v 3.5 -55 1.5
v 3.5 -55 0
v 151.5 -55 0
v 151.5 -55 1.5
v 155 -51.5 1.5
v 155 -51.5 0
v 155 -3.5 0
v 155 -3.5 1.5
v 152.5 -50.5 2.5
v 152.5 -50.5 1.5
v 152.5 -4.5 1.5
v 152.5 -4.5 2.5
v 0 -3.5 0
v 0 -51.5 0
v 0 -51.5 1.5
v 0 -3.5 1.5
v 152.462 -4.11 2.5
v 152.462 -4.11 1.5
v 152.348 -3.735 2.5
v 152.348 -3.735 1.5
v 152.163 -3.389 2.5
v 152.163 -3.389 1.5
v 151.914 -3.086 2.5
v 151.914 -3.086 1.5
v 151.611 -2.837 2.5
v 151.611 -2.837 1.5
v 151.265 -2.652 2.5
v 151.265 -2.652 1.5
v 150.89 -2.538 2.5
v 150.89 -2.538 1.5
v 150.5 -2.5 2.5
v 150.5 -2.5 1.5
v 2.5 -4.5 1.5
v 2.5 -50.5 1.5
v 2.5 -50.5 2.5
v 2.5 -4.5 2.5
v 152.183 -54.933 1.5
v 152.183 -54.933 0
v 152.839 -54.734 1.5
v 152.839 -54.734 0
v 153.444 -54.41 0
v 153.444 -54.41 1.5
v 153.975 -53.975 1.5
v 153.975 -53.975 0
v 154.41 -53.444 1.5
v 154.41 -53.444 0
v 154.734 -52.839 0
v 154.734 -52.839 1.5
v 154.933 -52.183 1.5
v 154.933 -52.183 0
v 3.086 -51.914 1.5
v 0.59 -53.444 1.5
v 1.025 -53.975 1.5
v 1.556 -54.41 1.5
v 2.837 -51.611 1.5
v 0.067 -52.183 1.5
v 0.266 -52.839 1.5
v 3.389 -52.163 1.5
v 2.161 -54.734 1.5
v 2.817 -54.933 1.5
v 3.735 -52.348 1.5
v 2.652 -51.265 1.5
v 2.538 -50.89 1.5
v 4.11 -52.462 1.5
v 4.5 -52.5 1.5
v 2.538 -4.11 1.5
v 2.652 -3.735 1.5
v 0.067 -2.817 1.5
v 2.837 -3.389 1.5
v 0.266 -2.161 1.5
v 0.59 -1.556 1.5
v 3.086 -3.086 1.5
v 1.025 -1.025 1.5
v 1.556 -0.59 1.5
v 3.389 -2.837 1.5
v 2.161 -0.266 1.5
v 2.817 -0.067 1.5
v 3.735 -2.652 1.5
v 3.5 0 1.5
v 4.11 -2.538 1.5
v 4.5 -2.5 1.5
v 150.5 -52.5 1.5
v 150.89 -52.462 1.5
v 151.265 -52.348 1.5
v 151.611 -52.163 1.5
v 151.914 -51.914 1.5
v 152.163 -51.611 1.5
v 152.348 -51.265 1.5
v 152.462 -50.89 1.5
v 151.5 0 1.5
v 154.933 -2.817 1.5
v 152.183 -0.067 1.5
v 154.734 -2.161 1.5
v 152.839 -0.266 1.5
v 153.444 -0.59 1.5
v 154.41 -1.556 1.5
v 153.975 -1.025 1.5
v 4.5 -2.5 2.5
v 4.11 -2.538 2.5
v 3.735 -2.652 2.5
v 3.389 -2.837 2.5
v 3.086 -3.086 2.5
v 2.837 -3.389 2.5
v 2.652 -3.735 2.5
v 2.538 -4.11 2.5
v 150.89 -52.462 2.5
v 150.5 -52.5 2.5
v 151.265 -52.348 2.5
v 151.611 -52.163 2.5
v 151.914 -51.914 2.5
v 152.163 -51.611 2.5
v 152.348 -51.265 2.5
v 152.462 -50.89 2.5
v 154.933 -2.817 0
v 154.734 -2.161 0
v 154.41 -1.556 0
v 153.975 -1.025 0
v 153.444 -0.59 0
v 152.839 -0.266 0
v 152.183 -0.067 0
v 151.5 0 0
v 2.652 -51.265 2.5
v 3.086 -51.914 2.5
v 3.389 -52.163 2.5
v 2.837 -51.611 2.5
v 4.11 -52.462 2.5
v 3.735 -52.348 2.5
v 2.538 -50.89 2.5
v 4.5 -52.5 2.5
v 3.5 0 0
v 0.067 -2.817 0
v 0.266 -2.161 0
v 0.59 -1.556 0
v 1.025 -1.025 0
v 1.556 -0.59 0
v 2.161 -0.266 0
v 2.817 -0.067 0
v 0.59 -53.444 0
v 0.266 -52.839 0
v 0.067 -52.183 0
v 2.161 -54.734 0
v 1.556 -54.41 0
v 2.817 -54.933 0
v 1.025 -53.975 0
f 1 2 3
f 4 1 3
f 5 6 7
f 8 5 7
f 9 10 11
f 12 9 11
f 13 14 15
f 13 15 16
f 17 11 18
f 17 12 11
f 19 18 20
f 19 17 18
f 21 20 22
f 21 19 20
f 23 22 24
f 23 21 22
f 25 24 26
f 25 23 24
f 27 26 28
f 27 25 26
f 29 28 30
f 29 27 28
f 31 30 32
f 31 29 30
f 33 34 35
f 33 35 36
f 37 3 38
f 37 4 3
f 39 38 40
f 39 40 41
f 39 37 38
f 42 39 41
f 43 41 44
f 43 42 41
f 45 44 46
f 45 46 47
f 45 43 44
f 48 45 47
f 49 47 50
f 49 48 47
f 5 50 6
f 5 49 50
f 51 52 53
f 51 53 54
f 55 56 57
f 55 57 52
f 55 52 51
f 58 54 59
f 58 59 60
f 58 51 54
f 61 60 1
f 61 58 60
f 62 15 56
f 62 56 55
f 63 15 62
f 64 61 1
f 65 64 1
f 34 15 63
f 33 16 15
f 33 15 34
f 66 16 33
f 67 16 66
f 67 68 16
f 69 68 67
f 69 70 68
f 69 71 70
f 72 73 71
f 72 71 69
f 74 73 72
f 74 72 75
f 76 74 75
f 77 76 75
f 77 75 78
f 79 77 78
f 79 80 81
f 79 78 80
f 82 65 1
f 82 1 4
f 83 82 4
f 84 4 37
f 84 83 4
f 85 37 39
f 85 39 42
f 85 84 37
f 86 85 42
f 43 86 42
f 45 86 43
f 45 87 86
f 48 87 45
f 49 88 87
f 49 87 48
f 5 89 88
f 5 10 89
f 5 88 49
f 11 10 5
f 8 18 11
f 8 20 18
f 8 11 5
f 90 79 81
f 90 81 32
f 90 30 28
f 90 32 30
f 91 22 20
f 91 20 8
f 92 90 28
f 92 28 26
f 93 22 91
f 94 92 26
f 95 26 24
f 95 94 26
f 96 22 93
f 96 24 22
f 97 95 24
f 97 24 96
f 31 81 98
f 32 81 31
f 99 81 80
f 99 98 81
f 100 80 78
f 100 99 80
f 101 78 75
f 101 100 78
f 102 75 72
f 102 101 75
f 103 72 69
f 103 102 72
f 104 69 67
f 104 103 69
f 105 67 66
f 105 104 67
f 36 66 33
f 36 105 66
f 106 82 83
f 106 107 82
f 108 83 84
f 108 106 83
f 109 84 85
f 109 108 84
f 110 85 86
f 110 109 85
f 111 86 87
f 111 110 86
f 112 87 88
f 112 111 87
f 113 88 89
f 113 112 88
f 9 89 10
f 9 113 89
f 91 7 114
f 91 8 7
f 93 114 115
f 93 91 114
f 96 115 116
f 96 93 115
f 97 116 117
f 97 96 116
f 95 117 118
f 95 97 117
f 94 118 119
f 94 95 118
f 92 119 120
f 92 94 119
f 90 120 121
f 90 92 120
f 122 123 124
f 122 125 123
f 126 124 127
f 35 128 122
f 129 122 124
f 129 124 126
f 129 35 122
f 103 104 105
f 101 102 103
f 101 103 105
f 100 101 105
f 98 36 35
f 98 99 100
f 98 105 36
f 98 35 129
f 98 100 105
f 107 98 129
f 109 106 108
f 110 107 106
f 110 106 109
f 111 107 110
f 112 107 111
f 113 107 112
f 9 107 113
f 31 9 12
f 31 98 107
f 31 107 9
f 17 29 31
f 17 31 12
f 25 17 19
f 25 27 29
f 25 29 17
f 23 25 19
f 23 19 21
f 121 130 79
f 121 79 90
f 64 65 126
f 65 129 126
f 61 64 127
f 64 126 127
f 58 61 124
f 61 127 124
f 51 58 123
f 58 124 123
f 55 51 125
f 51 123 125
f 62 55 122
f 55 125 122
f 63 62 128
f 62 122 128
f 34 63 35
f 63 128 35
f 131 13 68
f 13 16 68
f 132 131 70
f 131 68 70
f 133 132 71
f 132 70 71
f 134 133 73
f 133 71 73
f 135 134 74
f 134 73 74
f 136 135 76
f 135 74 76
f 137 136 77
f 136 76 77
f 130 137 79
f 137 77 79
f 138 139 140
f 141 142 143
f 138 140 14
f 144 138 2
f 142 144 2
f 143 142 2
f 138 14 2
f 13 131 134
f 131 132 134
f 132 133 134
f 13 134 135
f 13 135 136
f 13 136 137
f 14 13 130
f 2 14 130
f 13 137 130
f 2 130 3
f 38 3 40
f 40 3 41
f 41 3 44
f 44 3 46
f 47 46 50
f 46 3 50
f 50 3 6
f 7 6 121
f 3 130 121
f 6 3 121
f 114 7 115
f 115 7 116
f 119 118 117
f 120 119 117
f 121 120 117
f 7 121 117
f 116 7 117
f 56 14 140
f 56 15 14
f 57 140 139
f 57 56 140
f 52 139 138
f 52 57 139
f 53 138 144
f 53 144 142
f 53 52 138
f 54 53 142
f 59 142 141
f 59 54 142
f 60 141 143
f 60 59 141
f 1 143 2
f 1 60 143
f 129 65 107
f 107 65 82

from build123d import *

# Parameters (mm, degrees)
SKETCH_1_W      = 155
SKETCH_1_H      = 55
EXTRUDE_1_DEPTH = 1.5
FILLET_1_R      = 3.5
SKETCH_2_W      = 150
SKETCH_2_H      = 50
EXTRUDE_2_DEPTH = 1
FILLET_3_R      = 2


with BuildPart() as part:
    # 草图1 → 凸台-拉伸1 (new body)
    with BuildSketch(Plane.XY):
        with Locations((77.5, -27.5)):
            Rectangle(SKETCH_1_W, SKETCH_1_H)
    extrude(amount=EXTRUDE_1_DEPTH)

    # 圆角1
    fillet_1_edges = [part.edges().sort_by_distance(p)[0] for p in [
        (0, 0, 0.75),
        (155, 0, 0.75),
        (155, -55, 0.75),
        (0, -55, 0.75),
    ]]
    fillet(fillet_1_edges, radius=FILLET_1_R)

    # 草图2 → 凸台-拉伸2 (add)
    with BuildSketch(Plane.XY.offset(1.5)):
        with Locations((77.5, -27.5)):
            Rectangle(SKETCH_2_W, SKETCH_2_H)
    extrude(amount=EXTRUDE_2_DEPTH)

    # 圆角3
    fillet_3_edges = [part.edges().sort_by_distance(p)[0] for p in [
        (2.5, -2.5, 2),
        (2.5, -52.5, 2),
        (152.5, -52.5, 2),
        (152.5, -2.5, 2),
    ]]
    fillet(fillet_3_edges, radius=FILLET_3_R)


solid = part.part
